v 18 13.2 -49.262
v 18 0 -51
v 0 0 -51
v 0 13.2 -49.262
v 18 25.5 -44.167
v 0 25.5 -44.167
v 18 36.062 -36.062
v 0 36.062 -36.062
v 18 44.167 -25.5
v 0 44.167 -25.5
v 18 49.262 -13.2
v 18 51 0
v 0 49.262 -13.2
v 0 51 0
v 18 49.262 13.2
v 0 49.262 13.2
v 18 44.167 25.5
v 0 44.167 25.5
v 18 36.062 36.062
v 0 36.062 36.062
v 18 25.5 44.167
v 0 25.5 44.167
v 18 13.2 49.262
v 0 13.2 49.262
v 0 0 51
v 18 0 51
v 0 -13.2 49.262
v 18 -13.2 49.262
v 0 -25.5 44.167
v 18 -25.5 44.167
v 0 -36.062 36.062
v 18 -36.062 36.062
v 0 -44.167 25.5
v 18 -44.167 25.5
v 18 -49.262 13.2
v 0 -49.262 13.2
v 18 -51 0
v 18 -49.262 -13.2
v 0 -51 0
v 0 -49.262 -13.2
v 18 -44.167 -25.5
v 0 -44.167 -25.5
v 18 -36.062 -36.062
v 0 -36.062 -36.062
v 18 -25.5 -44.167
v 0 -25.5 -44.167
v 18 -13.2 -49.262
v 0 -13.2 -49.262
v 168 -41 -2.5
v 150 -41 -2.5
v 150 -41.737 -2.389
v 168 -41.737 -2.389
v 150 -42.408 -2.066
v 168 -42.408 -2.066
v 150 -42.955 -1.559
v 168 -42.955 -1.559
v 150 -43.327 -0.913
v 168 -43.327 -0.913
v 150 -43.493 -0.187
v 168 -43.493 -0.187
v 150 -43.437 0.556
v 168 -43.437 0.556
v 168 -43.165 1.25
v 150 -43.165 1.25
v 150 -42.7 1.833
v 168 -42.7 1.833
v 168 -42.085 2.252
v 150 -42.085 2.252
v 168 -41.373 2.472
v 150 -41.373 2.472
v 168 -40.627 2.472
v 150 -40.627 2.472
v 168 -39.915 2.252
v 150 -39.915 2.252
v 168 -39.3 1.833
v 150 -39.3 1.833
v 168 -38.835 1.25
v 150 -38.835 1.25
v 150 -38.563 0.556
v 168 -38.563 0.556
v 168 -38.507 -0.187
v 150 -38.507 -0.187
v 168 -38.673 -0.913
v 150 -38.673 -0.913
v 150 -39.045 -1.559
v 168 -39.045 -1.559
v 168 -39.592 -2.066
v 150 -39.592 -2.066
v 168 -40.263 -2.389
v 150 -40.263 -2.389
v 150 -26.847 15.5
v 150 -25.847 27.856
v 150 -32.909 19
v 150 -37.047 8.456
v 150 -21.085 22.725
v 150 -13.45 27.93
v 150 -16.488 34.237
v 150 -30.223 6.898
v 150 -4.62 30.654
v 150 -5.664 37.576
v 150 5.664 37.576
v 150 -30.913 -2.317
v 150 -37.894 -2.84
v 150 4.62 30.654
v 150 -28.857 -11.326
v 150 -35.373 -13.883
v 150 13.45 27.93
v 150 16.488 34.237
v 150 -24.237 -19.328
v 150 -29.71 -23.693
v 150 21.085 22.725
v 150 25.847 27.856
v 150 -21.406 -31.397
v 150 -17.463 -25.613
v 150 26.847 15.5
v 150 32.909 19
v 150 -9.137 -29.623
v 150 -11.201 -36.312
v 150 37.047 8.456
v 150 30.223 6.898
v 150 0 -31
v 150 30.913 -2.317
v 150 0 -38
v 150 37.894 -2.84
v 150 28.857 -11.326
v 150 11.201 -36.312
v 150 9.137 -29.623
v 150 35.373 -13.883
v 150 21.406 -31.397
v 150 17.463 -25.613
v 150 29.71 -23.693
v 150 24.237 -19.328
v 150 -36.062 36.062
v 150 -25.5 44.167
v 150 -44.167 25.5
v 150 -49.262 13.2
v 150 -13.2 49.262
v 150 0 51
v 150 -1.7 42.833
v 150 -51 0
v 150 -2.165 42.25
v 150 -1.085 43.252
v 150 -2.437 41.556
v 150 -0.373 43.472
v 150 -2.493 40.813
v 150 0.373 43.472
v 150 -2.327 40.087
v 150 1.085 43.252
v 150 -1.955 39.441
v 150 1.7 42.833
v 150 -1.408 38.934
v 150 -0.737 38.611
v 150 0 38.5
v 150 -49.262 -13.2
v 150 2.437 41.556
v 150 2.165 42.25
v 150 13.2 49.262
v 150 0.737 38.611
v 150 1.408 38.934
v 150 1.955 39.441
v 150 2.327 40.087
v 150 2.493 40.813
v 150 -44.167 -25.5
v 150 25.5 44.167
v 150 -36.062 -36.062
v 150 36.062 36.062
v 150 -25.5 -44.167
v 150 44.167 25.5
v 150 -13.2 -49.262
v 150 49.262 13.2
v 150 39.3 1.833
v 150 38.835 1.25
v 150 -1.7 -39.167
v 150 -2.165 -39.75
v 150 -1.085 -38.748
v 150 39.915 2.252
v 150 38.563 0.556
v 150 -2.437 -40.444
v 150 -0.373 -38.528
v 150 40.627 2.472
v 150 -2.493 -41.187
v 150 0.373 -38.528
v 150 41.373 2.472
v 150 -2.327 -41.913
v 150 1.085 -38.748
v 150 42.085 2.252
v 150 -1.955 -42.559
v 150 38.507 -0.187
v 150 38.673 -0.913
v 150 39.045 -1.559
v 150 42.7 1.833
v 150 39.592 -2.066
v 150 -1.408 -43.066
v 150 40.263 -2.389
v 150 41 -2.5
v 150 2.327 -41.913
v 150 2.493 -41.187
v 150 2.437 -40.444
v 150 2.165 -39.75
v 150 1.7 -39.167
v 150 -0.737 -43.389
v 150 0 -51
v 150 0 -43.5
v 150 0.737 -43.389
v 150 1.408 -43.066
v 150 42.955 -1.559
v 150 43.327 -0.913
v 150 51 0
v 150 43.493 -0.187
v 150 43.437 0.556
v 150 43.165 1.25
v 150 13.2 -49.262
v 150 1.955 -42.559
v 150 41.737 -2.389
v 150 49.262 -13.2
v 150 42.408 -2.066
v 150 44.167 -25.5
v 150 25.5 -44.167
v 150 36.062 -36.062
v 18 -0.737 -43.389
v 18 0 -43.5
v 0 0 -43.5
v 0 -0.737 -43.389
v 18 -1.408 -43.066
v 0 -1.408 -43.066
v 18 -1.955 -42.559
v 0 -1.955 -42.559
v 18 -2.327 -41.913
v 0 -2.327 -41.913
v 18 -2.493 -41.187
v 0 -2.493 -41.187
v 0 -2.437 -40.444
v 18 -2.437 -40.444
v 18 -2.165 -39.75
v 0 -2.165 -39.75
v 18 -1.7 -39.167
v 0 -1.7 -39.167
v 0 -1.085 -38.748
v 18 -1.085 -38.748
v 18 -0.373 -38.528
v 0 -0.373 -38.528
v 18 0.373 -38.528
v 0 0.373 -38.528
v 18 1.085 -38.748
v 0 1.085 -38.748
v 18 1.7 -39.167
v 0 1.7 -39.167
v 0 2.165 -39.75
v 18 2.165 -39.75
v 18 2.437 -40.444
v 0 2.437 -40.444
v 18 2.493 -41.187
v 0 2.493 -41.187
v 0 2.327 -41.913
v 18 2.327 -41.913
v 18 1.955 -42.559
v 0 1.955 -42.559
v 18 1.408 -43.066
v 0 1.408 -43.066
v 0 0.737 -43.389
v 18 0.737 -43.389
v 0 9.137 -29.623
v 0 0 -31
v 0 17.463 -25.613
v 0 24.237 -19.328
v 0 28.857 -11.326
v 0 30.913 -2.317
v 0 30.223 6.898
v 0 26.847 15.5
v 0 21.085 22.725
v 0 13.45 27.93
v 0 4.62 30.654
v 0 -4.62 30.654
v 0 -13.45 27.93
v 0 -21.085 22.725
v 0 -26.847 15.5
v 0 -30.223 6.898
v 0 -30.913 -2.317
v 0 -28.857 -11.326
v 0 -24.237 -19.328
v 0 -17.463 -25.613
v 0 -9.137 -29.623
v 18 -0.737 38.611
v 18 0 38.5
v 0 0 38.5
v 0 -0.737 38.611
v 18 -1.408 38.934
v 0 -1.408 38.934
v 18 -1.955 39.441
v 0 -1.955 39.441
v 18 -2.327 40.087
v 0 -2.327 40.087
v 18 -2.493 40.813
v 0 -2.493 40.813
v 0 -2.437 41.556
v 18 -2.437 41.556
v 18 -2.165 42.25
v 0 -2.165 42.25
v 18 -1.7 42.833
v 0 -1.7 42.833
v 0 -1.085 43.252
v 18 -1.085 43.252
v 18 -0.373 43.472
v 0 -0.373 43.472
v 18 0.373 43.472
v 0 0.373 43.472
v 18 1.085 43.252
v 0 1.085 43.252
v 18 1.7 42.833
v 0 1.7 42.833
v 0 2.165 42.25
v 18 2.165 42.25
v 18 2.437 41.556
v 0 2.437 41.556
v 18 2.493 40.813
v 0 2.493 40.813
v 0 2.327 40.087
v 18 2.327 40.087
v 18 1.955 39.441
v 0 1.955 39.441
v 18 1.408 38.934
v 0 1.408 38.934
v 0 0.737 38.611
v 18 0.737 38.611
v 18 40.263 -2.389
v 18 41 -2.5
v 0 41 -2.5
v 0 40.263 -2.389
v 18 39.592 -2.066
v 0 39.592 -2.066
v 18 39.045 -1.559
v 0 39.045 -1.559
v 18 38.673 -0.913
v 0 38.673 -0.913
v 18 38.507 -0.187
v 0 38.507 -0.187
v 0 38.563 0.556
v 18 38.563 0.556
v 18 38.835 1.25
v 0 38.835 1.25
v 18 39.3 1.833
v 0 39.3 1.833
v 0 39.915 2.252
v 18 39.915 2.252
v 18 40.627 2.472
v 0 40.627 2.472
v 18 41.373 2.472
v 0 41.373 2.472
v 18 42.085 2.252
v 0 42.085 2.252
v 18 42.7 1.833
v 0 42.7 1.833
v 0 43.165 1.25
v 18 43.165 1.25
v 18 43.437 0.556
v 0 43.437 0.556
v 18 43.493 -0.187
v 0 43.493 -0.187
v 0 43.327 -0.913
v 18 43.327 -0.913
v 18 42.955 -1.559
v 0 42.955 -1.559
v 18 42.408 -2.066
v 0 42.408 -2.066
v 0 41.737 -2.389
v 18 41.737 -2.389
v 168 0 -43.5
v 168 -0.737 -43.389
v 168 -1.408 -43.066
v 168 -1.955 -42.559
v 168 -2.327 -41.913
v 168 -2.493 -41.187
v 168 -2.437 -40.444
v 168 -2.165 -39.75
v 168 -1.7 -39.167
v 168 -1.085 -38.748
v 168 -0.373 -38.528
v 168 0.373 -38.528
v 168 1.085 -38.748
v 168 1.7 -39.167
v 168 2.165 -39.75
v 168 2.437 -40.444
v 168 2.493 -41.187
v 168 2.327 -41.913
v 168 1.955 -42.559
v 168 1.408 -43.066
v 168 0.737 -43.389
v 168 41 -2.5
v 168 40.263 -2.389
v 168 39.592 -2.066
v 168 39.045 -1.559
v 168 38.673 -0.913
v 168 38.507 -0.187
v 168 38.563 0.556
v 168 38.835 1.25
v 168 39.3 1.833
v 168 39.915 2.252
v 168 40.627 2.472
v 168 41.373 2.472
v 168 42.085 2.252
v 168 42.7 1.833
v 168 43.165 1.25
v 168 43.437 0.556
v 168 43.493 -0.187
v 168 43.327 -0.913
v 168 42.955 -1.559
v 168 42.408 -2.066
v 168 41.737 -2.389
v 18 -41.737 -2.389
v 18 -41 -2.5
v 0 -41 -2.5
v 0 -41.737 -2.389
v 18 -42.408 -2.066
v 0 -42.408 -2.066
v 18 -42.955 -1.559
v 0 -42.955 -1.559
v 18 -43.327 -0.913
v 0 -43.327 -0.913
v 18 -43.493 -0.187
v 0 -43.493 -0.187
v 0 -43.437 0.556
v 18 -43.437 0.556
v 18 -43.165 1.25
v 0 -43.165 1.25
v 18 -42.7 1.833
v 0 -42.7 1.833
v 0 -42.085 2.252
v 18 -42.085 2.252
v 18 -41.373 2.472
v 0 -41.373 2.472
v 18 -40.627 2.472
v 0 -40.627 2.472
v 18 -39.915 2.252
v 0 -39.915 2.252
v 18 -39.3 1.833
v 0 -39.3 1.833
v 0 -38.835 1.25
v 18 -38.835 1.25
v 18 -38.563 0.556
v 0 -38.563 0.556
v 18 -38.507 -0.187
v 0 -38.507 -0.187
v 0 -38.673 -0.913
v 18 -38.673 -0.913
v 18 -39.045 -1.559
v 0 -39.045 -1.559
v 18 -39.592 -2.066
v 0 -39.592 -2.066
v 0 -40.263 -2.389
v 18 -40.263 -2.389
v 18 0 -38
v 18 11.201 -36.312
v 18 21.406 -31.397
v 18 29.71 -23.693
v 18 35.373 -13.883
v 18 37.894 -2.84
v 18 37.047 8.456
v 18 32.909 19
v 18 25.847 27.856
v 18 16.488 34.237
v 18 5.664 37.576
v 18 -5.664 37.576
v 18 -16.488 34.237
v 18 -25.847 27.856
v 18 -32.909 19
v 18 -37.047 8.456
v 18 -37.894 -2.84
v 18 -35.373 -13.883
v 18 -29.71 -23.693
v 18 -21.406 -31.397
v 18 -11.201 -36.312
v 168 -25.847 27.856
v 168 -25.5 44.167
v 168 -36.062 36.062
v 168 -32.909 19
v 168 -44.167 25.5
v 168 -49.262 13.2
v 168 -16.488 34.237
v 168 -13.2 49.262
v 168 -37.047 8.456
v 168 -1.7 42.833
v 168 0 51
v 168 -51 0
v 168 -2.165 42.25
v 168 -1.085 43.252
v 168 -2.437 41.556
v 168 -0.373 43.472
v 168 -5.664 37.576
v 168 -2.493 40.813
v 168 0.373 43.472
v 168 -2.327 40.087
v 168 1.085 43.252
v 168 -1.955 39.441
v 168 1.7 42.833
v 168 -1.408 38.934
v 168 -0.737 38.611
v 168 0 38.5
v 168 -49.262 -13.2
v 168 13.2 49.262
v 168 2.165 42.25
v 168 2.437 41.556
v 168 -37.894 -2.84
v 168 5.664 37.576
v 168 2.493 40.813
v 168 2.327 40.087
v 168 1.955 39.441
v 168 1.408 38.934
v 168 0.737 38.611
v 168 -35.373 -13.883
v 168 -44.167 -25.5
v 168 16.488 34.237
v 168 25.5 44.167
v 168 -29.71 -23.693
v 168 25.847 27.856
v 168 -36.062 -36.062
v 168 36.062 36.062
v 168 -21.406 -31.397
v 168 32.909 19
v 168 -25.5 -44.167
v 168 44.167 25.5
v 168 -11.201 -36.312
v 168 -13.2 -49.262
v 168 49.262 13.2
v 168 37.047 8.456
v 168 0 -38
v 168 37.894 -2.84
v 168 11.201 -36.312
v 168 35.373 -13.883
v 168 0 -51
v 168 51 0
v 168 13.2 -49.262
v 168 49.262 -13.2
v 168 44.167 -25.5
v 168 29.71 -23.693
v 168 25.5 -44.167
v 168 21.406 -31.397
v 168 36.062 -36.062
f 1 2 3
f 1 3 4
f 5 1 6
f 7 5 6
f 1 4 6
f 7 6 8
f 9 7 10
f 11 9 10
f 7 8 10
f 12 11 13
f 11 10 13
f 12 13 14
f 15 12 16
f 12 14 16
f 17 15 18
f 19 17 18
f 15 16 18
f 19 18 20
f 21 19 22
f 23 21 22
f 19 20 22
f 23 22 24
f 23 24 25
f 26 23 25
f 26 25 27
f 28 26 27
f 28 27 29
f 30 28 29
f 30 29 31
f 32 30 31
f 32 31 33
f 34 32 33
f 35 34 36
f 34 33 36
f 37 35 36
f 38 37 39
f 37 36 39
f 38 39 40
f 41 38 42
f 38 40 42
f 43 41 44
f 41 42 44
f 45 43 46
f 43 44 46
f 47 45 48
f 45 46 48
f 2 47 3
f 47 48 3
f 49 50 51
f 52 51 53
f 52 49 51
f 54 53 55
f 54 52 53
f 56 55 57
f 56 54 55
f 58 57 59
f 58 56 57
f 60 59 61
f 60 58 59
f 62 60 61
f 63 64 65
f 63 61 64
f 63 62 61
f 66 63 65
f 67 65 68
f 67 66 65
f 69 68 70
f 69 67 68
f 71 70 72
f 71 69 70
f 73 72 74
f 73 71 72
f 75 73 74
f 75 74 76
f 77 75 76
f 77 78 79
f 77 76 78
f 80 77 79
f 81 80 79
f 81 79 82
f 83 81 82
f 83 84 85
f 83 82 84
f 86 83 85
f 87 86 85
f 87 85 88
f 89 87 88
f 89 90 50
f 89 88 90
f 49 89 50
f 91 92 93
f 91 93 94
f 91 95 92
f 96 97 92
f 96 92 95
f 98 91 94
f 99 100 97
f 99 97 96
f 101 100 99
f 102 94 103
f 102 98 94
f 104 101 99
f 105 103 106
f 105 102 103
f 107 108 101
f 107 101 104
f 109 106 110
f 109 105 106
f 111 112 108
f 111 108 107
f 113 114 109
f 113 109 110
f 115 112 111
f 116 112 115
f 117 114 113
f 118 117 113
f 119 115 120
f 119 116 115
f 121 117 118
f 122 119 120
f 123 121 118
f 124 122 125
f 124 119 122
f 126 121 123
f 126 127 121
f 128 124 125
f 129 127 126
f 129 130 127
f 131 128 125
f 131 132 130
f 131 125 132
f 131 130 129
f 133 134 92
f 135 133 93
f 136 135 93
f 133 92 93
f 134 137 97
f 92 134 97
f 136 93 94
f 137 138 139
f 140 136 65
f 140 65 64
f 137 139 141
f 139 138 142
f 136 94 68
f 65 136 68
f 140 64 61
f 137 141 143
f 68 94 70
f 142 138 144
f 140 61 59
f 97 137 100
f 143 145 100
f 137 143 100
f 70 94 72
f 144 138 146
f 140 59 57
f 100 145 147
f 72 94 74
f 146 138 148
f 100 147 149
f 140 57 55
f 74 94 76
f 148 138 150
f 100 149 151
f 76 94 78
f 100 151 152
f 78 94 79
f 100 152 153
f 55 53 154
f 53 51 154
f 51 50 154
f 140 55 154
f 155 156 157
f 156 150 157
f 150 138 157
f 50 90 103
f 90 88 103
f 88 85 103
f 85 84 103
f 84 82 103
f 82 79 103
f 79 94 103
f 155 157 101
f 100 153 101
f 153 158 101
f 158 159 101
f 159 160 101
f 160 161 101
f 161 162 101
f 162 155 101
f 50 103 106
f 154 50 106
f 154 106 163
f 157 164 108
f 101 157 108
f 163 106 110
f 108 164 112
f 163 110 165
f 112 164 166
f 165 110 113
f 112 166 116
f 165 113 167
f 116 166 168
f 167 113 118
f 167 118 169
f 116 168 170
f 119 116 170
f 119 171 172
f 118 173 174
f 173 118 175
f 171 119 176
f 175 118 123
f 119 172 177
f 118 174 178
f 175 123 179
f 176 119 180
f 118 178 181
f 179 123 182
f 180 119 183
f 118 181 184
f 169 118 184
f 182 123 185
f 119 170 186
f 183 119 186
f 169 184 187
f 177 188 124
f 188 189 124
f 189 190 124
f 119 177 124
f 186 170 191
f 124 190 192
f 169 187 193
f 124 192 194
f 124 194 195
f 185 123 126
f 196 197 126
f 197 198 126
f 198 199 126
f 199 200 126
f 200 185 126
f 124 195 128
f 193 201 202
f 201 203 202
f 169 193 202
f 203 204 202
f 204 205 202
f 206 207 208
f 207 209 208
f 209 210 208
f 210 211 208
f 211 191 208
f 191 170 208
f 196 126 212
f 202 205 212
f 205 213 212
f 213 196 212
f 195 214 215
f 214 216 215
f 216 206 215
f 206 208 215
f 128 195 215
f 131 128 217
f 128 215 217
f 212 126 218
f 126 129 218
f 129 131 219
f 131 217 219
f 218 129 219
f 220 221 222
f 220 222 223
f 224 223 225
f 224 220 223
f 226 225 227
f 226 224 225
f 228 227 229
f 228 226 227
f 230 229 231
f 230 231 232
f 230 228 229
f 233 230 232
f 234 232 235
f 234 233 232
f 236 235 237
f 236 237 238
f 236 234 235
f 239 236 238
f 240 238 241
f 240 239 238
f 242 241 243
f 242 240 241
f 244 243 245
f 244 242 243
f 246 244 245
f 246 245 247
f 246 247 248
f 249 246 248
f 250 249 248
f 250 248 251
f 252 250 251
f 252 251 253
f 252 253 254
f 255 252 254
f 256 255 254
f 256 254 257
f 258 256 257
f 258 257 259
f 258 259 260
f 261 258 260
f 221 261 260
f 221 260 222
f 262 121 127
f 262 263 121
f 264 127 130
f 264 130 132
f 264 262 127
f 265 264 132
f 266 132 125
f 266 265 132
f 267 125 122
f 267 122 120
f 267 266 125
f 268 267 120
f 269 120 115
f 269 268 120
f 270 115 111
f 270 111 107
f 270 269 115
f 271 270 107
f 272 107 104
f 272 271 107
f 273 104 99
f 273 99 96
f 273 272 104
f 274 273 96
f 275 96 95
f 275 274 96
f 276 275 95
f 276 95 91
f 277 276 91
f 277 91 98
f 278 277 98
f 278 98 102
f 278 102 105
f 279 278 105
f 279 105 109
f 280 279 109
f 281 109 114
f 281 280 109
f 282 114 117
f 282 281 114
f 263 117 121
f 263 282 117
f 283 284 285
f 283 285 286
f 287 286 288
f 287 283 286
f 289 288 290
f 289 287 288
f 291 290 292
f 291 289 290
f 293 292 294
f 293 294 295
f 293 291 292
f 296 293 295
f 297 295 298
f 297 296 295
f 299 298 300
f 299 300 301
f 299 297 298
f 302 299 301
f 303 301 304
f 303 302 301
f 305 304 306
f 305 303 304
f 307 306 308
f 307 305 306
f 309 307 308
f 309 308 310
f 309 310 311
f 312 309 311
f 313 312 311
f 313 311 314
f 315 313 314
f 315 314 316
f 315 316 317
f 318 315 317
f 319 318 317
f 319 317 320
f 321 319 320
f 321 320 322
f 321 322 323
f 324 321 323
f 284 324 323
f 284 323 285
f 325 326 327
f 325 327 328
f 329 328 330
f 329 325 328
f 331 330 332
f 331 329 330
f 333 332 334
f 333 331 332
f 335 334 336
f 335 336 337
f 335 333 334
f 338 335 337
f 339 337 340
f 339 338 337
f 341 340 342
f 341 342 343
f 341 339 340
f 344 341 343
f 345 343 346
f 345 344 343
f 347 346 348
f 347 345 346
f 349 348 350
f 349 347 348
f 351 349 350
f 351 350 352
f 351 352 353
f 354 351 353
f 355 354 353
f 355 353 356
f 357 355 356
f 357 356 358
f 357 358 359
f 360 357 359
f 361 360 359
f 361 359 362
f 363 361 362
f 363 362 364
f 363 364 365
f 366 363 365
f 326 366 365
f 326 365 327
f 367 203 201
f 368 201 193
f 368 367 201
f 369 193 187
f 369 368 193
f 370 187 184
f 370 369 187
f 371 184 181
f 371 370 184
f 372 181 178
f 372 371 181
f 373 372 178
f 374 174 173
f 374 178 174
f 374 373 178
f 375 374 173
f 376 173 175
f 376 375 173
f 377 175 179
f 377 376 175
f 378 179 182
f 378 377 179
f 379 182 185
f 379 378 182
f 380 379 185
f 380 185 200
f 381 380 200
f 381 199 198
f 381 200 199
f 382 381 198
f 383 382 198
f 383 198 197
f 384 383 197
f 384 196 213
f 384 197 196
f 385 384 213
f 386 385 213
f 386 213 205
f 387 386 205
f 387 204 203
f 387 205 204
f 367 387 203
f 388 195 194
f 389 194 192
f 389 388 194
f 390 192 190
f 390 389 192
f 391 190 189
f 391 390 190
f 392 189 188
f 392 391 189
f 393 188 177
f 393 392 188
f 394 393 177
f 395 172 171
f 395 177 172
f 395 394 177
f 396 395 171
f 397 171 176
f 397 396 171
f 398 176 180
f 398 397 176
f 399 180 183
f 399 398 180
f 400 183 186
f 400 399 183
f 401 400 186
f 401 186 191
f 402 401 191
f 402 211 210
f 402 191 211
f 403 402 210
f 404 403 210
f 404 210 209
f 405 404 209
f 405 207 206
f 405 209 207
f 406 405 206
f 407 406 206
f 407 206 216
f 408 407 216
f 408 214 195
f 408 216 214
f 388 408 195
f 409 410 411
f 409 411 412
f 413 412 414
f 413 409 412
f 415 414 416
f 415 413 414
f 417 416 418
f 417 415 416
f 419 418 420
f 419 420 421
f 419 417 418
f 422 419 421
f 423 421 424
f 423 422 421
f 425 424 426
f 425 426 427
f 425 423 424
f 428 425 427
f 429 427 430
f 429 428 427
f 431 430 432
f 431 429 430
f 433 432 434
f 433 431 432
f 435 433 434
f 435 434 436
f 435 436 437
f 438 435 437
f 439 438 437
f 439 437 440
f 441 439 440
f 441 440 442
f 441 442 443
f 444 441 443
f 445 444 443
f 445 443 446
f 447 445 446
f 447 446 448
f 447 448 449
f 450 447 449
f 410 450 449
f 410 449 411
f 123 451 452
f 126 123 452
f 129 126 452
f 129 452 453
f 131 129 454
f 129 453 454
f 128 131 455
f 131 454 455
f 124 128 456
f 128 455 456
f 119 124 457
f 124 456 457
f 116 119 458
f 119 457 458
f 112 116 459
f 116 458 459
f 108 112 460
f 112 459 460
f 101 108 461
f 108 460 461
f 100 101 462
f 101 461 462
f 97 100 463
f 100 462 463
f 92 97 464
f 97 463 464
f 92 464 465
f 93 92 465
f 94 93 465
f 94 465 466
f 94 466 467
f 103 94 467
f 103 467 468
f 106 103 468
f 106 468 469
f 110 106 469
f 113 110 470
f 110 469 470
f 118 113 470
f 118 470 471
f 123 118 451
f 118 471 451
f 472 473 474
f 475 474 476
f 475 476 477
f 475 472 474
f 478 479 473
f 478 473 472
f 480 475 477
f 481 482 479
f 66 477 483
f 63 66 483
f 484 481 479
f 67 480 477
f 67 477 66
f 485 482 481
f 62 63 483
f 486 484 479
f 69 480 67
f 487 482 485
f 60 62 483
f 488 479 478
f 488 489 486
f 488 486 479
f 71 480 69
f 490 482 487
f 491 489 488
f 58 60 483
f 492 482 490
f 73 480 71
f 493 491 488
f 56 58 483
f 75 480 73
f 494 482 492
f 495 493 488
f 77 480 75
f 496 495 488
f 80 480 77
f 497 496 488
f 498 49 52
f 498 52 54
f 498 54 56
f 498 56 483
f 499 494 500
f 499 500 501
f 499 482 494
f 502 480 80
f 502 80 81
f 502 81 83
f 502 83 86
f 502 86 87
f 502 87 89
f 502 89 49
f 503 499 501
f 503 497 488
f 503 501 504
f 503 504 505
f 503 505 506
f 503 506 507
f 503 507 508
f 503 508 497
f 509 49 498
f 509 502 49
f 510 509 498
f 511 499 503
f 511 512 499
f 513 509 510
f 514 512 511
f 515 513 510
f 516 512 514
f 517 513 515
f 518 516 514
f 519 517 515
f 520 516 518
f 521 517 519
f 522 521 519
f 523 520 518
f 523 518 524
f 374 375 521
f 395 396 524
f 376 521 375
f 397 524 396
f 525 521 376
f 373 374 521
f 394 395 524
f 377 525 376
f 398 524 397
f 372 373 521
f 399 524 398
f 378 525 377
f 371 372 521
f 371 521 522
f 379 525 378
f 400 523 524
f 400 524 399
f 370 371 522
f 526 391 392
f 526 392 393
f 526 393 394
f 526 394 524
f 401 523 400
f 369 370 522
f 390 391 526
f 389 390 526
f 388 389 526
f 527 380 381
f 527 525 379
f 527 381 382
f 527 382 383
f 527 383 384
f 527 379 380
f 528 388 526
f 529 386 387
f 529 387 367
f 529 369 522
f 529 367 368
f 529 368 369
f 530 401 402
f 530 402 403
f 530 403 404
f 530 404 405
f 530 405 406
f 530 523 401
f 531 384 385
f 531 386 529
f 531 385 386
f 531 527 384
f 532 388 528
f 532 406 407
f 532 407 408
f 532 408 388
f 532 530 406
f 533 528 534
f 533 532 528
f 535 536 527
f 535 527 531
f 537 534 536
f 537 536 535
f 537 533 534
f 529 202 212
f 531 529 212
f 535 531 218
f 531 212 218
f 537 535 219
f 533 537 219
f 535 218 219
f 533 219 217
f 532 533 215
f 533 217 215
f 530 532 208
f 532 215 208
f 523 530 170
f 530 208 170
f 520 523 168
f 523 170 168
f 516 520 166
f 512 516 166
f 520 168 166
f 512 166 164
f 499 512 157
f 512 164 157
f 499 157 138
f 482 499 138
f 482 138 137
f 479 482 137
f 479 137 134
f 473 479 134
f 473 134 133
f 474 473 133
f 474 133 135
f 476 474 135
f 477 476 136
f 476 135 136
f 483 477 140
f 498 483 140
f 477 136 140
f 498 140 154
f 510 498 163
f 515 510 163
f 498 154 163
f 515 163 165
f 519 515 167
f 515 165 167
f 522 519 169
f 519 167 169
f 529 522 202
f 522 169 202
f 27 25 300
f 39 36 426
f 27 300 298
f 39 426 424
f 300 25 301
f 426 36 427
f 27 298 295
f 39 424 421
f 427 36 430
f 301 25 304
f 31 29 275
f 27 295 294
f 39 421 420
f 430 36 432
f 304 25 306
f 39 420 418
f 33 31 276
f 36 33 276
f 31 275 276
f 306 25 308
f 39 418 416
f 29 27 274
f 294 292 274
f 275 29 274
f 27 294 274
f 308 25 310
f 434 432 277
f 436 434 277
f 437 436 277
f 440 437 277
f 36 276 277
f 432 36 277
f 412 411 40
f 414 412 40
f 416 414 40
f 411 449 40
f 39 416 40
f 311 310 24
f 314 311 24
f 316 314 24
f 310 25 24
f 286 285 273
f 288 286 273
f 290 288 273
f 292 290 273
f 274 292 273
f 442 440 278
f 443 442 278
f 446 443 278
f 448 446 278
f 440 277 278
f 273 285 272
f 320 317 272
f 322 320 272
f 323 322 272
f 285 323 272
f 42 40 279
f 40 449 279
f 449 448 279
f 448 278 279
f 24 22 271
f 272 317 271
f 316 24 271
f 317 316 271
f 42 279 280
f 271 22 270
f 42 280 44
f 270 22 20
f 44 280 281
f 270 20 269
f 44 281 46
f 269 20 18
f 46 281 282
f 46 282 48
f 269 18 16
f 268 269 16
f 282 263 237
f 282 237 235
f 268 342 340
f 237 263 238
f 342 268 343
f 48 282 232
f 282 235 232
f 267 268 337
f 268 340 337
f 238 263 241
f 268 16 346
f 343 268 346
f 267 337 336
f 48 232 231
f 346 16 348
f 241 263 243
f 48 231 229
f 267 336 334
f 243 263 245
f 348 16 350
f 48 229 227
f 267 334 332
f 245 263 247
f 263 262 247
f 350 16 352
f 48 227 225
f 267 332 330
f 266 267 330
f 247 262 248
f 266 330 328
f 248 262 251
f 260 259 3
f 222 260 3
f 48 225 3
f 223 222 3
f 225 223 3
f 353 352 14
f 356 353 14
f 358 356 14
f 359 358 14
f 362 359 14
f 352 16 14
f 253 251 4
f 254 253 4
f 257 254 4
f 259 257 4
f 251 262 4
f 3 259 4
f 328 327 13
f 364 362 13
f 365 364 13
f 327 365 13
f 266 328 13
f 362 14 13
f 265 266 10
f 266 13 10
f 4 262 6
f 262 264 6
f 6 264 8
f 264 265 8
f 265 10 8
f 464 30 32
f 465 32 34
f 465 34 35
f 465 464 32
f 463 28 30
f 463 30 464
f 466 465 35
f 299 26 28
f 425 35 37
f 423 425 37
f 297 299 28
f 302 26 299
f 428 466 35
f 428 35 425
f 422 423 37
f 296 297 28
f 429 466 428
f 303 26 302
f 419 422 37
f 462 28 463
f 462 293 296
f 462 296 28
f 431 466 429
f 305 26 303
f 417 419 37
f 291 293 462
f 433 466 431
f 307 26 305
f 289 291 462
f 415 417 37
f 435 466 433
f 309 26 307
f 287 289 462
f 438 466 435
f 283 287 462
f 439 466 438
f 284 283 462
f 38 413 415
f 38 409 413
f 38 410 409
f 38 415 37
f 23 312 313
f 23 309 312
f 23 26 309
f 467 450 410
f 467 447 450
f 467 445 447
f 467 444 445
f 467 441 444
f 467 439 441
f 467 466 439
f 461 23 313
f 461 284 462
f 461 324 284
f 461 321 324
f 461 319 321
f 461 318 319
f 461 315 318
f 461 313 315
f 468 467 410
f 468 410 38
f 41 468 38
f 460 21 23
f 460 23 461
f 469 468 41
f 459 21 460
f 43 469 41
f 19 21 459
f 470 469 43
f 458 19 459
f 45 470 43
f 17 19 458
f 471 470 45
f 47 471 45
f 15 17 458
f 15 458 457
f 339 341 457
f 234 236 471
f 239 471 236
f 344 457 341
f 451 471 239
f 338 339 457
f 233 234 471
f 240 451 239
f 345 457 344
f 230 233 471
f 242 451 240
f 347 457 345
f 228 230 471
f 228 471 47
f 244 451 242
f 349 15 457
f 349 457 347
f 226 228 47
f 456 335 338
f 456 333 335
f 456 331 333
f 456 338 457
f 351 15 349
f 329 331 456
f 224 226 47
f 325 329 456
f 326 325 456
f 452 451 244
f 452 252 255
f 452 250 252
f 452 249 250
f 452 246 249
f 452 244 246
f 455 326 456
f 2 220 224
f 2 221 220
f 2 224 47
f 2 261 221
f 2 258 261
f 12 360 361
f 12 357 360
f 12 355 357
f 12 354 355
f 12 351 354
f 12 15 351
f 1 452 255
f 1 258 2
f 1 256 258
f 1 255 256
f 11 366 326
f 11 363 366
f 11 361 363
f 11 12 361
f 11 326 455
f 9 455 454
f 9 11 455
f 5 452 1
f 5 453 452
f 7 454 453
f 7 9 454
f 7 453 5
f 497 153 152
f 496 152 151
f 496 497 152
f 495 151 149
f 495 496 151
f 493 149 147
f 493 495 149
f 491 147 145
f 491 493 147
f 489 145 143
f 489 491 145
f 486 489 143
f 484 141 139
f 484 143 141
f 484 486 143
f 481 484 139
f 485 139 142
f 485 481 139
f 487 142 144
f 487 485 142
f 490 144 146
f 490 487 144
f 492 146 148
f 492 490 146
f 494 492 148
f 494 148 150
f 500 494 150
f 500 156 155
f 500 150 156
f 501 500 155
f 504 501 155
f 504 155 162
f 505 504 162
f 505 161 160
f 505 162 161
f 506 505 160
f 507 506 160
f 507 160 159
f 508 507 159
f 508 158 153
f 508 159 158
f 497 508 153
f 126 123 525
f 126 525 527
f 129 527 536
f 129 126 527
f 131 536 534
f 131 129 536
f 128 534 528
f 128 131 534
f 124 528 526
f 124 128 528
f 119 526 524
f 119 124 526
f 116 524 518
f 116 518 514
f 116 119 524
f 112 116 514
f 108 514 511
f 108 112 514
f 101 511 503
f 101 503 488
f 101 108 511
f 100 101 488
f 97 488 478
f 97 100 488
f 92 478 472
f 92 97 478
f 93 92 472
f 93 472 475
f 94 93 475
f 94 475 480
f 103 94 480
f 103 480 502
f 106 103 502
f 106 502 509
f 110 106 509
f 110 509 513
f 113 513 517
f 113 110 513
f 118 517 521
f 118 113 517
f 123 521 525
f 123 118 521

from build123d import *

# Parameters (mm, degrees)
SKETCH_1_R          = 51
SKETCH_1_R_2        = 31
EXTRUDE_1_DEPTH     = 18
SKETCH_2_R          = 38
SKETCH_2_R_2        = 31
EXTRUDE_2_DEPTH     = 132
SKETCH_3_R          = 51
SKETCH_3_R_2        = 38
EXTRUDE_3_DEPTH     = 18
CUT_EXTRUDE_START   = -168
SKETCH_4_R          = 2.5
CUT_EXTRUDE_1_DEPTH = 168


with BuildPart() as part:
    # 草图1 → 凸台-拉伸1 (new body)
    with BuildSketch(Plane(origin=(0, 0, 0), x_dir=(0, 0, -1), z_dir=(1, 0, 0))):
        Circle(SKETCH_1_R)
        Circle(SKETCH_1_R_2, mode=Mode.SUBTRACT)
    extrude(amount=EXTRUDE_1_DEPTH)

    # 草图2 → 凸台-拉伸2 (add)
    with BuildSketch(Plane(origin=(18, 0, 0), x_dir=(0, 0, -1), z_dir=(1, 0, 0))):
        Circle(SKETCH_2_R)
        Circle(SKETCH_2_R_2, mode=Mode.SUBTRACT)
    extrude(amount=EXTRUDE_2_DEPTH)


with BuildPart() as body_2:
    # 草图3 → 凸台-拉伸3 (new body)
    with BuildSketch(Plane(origin=(150, 0, 0), x_dir=(0, 0, -1), z_dir=(1, 0, 0))):
        Circle(SKETCH_3_R)
        Circle(SKETCH_3_R_2, mode=Mode.SUBTRACT)
    extrude(amount=EXTRUDE_3_DEPTH)


with BuildPart() as cut_extrude_1_tool:
    # 草图4 → 切除-拉伸1 (new body)
    with BuildSketch(Plane.ZY.offset(CUT_EXTRUDE_START)):
        with Locations(Location((0, 41, 0), (0, 0, 180))):
            Circle(SKETCH_4_R)
        with Locations(Location((41, 0, 0), (0, 0, 180))):
            Circle(SKETCH_4_R)
        with Locations(Location((0, -41, 0), (0, 0, 180))):
            Circle(SKETCH_4_R)
        with Locations(Location((-41, 0, 0), (0, 0, 180))):
            Circle(SKETCH_4_R)
    extrude(amount=CUT_EXTRUDE_1_DEPTH)


with BuildPart() as part_1:
    add(part.part)

    # 切除-拉伸1: cut by cut_extrude_1_tool
    add(cut_extrude_1_tool.part, mode=Mode.SUBTRACT)


with BuildPart() as body_2_1:
    add(body_2.part)

    # 切除-拉伸1: cut by cut_extrude_1_tool
    add(cut_extrude_1_tool.part, mode=Mode.SUBTRACT)


solid = Compound([part_1.part, body_2_1.part])
